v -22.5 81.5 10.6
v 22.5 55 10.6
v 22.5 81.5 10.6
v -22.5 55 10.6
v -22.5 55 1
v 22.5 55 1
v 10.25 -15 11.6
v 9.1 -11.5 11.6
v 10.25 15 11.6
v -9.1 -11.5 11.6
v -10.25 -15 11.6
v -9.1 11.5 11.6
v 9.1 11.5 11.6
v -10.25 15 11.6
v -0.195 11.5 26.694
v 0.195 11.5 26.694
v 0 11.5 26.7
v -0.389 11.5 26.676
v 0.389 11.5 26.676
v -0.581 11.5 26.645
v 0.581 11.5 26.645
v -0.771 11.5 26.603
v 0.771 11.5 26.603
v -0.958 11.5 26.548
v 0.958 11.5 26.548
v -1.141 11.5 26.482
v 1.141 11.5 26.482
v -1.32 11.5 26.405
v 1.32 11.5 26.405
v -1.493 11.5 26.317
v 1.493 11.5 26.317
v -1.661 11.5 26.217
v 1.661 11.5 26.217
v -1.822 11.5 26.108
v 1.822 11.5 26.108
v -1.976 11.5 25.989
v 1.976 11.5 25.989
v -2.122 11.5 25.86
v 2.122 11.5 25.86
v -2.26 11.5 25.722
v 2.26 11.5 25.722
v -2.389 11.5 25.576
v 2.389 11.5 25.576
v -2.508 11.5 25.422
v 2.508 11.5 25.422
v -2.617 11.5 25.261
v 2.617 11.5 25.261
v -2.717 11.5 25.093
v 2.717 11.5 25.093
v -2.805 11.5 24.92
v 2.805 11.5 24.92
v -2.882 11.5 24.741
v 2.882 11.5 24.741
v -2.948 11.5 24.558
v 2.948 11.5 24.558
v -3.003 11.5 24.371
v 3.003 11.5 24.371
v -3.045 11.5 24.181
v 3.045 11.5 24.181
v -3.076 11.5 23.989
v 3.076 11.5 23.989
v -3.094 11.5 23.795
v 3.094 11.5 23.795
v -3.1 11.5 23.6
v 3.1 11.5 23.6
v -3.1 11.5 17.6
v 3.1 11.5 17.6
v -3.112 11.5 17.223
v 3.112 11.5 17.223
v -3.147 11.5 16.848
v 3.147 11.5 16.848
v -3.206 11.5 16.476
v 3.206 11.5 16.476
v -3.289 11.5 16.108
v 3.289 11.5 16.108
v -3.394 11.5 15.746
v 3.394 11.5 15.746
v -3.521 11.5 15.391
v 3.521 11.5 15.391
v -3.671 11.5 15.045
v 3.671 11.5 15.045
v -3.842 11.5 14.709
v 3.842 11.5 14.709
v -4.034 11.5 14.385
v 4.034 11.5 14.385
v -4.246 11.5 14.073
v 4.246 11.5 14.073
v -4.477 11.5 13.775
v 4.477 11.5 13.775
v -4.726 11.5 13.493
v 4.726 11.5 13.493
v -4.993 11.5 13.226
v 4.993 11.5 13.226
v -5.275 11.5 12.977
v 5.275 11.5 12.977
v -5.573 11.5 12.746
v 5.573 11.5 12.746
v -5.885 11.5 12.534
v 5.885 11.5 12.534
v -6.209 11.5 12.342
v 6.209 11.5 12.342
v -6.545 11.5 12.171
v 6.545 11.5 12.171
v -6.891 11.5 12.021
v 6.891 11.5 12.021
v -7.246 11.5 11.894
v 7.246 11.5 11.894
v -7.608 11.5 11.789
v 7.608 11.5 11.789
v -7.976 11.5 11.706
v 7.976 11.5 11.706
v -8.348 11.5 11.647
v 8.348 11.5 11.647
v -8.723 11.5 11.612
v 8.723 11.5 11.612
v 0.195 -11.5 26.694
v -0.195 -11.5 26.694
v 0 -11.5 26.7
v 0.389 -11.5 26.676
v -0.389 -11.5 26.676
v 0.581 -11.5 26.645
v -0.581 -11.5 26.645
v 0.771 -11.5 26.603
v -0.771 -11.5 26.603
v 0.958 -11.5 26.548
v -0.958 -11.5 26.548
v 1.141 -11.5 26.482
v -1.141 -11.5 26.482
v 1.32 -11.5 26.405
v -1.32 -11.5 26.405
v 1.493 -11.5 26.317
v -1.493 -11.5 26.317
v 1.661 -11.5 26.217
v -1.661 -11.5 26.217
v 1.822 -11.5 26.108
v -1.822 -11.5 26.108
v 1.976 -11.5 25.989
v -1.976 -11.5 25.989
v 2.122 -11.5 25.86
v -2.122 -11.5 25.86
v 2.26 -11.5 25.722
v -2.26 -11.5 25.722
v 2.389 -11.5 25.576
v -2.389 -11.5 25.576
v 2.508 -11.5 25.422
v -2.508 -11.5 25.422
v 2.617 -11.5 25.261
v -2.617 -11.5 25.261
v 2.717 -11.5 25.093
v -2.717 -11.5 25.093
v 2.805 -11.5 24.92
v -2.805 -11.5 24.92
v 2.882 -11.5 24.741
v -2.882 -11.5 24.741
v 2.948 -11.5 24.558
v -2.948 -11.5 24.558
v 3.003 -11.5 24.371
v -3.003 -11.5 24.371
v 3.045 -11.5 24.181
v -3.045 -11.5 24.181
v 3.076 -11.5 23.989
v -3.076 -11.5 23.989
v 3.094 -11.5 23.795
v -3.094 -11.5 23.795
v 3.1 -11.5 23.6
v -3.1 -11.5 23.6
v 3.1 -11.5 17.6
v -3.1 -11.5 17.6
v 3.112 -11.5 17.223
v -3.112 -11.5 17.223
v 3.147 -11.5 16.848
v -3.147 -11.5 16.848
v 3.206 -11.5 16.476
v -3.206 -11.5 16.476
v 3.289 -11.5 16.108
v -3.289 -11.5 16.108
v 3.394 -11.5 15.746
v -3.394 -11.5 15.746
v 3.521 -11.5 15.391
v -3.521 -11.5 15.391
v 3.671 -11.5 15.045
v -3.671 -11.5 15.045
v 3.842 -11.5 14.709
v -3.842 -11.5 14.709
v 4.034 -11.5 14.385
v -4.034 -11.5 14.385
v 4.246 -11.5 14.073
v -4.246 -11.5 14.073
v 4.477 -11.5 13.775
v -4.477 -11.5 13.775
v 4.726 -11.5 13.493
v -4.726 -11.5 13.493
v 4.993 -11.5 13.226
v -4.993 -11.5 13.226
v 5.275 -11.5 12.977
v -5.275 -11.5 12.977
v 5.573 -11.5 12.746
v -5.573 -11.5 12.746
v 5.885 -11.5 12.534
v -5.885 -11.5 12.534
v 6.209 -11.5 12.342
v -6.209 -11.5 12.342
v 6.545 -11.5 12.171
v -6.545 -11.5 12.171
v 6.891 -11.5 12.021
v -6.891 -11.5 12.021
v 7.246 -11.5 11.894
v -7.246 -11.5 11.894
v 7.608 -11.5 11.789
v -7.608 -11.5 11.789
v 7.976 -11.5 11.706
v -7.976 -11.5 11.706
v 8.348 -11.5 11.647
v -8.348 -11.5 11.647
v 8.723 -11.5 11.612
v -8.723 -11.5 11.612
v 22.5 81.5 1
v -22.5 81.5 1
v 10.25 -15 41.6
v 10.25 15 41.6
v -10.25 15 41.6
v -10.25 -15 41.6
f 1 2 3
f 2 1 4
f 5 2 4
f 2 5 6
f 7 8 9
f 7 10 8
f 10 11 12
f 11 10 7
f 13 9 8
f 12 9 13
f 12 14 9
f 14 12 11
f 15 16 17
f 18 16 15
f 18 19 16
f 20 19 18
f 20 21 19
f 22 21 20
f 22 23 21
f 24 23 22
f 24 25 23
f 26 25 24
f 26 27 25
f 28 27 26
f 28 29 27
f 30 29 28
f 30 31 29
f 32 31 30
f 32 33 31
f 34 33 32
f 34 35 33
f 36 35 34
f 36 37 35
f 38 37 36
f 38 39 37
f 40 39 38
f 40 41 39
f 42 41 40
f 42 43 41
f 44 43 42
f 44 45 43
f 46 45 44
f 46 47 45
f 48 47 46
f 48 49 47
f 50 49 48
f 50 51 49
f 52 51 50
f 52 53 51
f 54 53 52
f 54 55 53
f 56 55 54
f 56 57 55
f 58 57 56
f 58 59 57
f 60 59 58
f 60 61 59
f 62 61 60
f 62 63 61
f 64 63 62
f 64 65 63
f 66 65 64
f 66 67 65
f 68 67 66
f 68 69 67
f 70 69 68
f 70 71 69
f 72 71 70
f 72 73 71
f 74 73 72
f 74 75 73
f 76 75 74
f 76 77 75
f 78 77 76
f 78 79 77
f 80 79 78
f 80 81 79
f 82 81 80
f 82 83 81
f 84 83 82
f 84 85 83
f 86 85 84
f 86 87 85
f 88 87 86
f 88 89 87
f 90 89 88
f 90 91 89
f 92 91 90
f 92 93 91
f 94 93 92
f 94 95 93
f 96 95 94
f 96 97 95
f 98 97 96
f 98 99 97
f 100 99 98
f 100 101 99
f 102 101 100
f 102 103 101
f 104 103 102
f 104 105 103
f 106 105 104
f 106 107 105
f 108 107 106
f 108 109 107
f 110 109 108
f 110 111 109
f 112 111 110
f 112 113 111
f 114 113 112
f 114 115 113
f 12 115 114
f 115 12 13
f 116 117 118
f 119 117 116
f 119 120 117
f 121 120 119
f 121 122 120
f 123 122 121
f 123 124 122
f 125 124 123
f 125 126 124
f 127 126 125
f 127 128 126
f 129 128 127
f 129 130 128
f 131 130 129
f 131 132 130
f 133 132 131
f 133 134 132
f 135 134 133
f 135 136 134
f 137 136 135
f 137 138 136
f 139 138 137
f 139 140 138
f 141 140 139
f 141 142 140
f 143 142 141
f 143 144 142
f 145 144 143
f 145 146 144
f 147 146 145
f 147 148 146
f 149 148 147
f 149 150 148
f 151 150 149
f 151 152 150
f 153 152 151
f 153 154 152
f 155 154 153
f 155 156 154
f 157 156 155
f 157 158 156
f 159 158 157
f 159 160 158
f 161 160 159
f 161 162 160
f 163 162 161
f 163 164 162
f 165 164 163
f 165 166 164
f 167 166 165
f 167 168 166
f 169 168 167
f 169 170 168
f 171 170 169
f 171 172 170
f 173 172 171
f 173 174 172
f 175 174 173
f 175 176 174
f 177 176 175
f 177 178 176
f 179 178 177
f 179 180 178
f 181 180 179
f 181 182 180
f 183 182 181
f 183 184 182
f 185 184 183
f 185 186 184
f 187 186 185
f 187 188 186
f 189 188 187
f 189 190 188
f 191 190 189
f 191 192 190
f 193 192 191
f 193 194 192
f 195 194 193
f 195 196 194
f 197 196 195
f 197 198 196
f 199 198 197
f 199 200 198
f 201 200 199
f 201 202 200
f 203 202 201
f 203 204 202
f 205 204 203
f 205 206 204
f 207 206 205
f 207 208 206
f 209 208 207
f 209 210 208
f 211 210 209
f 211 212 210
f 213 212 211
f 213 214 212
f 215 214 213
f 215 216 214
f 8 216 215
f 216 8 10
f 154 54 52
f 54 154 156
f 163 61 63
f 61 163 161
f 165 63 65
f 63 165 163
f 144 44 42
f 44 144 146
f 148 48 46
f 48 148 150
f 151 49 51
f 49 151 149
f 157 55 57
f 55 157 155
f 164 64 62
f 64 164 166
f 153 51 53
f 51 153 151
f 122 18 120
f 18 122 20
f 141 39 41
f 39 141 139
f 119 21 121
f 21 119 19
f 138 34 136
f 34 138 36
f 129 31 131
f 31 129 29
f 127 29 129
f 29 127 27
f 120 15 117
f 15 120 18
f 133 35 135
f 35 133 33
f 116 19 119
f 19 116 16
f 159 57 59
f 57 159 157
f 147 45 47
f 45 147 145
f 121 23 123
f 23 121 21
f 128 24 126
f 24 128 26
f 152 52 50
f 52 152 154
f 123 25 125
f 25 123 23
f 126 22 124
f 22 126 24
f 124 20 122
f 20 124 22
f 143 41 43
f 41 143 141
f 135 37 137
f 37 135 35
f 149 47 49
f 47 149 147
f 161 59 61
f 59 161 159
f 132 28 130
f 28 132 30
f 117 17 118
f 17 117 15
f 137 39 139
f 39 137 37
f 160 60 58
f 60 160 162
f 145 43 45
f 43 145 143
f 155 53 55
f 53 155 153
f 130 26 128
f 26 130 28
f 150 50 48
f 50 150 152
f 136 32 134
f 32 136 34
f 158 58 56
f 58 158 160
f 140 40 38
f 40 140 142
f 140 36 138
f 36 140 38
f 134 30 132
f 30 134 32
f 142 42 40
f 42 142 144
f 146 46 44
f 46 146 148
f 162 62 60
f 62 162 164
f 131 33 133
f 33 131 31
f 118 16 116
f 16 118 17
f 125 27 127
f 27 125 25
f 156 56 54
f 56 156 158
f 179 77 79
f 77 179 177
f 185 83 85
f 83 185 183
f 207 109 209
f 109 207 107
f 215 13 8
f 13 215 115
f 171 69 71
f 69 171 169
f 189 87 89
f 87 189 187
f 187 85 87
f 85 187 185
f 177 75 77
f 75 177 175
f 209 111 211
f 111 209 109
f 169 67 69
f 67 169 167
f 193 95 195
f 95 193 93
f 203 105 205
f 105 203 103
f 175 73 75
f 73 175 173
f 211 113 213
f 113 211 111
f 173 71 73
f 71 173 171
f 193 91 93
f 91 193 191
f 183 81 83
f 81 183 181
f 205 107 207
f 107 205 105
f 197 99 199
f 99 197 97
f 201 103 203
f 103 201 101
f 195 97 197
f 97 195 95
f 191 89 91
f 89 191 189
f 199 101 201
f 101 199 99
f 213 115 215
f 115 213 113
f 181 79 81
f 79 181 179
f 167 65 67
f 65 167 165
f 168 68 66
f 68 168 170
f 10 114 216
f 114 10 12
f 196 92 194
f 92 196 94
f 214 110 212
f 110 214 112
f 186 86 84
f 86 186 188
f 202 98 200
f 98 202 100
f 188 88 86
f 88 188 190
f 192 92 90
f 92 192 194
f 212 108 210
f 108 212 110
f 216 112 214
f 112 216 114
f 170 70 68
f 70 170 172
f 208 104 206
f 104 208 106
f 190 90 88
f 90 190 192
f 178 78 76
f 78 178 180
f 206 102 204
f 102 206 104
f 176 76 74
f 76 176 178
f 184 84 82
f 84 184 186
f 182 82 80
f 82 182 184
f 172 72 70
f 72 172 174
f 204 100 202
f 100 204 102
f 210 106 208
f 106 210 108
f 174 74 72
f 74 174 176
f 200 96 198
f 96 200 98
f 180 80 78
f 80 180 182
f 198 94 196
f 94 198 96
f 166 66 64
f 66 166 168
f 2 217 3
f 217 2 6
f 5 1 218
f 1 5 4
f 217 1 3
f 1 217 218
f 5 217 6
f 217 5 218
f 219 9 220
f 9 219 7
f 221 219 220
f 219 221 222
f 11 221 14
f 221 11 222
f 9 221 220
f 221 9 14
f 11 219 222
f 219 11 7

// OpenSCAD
//
// ktLOCK1
//
 
gap1 = 0.001;
gap2 = 0.002;
th = 2;

W = 69.5;
D = 37.5;
H = 90.5;

NR = 23;
NT = 6.2;
NH = 13;

UL = 35;

AW = 20.5;

base();
adapter();


module base()
{
difference()
{
    union()
    {
        translate([-45/2, UL, 0]) cube([45, 46.5, 10.6]);
    }
    translate([-45/2, UL, 0]) cube([45, 46.5, 1]); //tape
    
    translate([0, -NR/2, 0]) knob();
}
}


module adapter()
{
difference()
{
    union()
    {
        translate([-AW/2, -30/2, 10.6+1]) cube([AW, 30, 30]);
    }
    translate([-45/2, UL, 0]) cube([45, 46.5, 1]); //tape
    
    translate([0, -NR/2, 0]) knob();
}
}



module knob()
{
rr=12;
difference()
{
    union()
    {
        translate([-50.5/2, 0, 0]) cube([50.5, 66.5, 10.6]);
        
        translate([0, NR/2, 10.6]) cylinder(r=NR/2, h=1, $fn=100);
        //translate([0, NR/2, 10.6]) cylinder(r=NR/2, h=13, $fn=100);
        translate([-NR/2, 0, 10.6+1]) cube([NR, NR, NH-1]);
        translate([0, NR, 10.6+NH]) rotate([90, 0, 0]) cylinder(r=NT/2, h=NR, $fn=100);
    }
    translate([NT/2+rr/2, NR, 10.6+1+rr/2]) rotate([90, 0, 0]) cylinder(r=rr/2, h=NR, $fn=100);
    translate([NT/2+rr/2, 0, 10.6+1]) cube([rr, NR, rr]);
    translate([NT/2, 0, 10.6+1+rr/2]) cube([rr, NR, rr]);
    translate([-NT/2-rr/2, NR, 10.6+1+rr/2]) rotate([90, 0, 0]) cylinder(r=rr/2, h=NR, $fn=100);
    translate([-NT/2-rr-rr/2, 0, 10.6+1]) cube([rr, NR, rr]);
    translate([-NT/2-rr, 0, 10.6+1+rr/2]) cube([rr, NR, rr]);
}
}

/*
module base()
{
difference()
{
    union()
    {
        translate([-W/2, -0.5-14-th+7/2+th, -42]) cube([W, 60, 42]);
    }
   
    unit();
   
    translate([-6/2, -7/2-0.5, -16-25]) cube([6, 60, 12]);
}
}
 
module unit()
{
    translate([-W/2, 0, 0]) cube([W, D, H]);
   
    translate([-2.5, -(7+1)/2-0.5+1.5, -16-2]) rotate([0, 0, 0]) cylinder(r1=(7+1)/2, r2=(7+1)/2,  h=16+2, $fn=100);
    translate([2.5, -(7+1)/2-0.5+1.5, -16-2]) rotate([0, 0, 0]) cylinder(r1=(7+1)/2, r2=(7+1)/2,  h=16+2, $fn=100);
    translate([-5/2, -(7+1)-0.5+1.5, -16-2]) cube([5, (7+1), 16+2]);
    translate([0, -(7+1)/2-0.5+0.5, -16-25]) rotate([0, 0, 0]) cylinder(r1=6/2, r2=6/2,  h=25, $fn=100);
    
    translate([-(5+(7+1))/2, -(7+1)-0.5+(7+1)/2+1.5, -16-2]) cube([5+(7+1), (7+1)+50, 16+2]);
    translate([-6/2, -(7+1)-0.5+(7+1)/2, -16-25]) cube([6, (7+1)+50, 25]);
}

module futa()
{
difference()
{
    translate([0, 0, 35]) rotate([-45, 0, 0]) 
    union()
    {
        translate([-(5+(7+1))/2+0.5/2, -(7+1)-0.5+(7+1)/2+1.5, -16-2]) cube([5+(7+1)-0.5, (7+1)+50-0.5, 16+2-0.5]);
        
    }
    
    translate([0, 0, 35]) rotate([-45, 0, 0]) 
    union()
    {
        translate([-2.5, -(7+1)/2-0.5+0.5+1.5-1.5, -16-2-1]) rotate([0, 0, 0]) cylinder(r1=(7+1)/2, r2=(7+1)/2,  h=16+2+1, $fn=100);
        translate([2.5, -(7+1)/2-0.5+0.5+1.5-1.5, -16-2-1]) rotate([0, 0, 0]) cylinder(r1=(7+1)/2, r2=(7+1)/2,  h=16+2+1, $fn=100);
        translate([-5/2, -(7+1)-0.5+0.5+1.5-1.5, -16-2-1]) cube([5, (7+1), 16+2+1]);
    }

    translate([0, -(7+1)/2-0.5-2, 25/2]) rotate([-90, 0, 0]) cylinder(r1=6/2, r2=6/2,  h=25+15, $fn=100);
    
    translate([-6/2, -(7+1)-0.5+(7+1)/2, 0]) cube([6, (7+1)+50, 25/2]);
    translate([-500/2, -500/2, -100]) cube([500, 500, 100]);
}
}
*/
